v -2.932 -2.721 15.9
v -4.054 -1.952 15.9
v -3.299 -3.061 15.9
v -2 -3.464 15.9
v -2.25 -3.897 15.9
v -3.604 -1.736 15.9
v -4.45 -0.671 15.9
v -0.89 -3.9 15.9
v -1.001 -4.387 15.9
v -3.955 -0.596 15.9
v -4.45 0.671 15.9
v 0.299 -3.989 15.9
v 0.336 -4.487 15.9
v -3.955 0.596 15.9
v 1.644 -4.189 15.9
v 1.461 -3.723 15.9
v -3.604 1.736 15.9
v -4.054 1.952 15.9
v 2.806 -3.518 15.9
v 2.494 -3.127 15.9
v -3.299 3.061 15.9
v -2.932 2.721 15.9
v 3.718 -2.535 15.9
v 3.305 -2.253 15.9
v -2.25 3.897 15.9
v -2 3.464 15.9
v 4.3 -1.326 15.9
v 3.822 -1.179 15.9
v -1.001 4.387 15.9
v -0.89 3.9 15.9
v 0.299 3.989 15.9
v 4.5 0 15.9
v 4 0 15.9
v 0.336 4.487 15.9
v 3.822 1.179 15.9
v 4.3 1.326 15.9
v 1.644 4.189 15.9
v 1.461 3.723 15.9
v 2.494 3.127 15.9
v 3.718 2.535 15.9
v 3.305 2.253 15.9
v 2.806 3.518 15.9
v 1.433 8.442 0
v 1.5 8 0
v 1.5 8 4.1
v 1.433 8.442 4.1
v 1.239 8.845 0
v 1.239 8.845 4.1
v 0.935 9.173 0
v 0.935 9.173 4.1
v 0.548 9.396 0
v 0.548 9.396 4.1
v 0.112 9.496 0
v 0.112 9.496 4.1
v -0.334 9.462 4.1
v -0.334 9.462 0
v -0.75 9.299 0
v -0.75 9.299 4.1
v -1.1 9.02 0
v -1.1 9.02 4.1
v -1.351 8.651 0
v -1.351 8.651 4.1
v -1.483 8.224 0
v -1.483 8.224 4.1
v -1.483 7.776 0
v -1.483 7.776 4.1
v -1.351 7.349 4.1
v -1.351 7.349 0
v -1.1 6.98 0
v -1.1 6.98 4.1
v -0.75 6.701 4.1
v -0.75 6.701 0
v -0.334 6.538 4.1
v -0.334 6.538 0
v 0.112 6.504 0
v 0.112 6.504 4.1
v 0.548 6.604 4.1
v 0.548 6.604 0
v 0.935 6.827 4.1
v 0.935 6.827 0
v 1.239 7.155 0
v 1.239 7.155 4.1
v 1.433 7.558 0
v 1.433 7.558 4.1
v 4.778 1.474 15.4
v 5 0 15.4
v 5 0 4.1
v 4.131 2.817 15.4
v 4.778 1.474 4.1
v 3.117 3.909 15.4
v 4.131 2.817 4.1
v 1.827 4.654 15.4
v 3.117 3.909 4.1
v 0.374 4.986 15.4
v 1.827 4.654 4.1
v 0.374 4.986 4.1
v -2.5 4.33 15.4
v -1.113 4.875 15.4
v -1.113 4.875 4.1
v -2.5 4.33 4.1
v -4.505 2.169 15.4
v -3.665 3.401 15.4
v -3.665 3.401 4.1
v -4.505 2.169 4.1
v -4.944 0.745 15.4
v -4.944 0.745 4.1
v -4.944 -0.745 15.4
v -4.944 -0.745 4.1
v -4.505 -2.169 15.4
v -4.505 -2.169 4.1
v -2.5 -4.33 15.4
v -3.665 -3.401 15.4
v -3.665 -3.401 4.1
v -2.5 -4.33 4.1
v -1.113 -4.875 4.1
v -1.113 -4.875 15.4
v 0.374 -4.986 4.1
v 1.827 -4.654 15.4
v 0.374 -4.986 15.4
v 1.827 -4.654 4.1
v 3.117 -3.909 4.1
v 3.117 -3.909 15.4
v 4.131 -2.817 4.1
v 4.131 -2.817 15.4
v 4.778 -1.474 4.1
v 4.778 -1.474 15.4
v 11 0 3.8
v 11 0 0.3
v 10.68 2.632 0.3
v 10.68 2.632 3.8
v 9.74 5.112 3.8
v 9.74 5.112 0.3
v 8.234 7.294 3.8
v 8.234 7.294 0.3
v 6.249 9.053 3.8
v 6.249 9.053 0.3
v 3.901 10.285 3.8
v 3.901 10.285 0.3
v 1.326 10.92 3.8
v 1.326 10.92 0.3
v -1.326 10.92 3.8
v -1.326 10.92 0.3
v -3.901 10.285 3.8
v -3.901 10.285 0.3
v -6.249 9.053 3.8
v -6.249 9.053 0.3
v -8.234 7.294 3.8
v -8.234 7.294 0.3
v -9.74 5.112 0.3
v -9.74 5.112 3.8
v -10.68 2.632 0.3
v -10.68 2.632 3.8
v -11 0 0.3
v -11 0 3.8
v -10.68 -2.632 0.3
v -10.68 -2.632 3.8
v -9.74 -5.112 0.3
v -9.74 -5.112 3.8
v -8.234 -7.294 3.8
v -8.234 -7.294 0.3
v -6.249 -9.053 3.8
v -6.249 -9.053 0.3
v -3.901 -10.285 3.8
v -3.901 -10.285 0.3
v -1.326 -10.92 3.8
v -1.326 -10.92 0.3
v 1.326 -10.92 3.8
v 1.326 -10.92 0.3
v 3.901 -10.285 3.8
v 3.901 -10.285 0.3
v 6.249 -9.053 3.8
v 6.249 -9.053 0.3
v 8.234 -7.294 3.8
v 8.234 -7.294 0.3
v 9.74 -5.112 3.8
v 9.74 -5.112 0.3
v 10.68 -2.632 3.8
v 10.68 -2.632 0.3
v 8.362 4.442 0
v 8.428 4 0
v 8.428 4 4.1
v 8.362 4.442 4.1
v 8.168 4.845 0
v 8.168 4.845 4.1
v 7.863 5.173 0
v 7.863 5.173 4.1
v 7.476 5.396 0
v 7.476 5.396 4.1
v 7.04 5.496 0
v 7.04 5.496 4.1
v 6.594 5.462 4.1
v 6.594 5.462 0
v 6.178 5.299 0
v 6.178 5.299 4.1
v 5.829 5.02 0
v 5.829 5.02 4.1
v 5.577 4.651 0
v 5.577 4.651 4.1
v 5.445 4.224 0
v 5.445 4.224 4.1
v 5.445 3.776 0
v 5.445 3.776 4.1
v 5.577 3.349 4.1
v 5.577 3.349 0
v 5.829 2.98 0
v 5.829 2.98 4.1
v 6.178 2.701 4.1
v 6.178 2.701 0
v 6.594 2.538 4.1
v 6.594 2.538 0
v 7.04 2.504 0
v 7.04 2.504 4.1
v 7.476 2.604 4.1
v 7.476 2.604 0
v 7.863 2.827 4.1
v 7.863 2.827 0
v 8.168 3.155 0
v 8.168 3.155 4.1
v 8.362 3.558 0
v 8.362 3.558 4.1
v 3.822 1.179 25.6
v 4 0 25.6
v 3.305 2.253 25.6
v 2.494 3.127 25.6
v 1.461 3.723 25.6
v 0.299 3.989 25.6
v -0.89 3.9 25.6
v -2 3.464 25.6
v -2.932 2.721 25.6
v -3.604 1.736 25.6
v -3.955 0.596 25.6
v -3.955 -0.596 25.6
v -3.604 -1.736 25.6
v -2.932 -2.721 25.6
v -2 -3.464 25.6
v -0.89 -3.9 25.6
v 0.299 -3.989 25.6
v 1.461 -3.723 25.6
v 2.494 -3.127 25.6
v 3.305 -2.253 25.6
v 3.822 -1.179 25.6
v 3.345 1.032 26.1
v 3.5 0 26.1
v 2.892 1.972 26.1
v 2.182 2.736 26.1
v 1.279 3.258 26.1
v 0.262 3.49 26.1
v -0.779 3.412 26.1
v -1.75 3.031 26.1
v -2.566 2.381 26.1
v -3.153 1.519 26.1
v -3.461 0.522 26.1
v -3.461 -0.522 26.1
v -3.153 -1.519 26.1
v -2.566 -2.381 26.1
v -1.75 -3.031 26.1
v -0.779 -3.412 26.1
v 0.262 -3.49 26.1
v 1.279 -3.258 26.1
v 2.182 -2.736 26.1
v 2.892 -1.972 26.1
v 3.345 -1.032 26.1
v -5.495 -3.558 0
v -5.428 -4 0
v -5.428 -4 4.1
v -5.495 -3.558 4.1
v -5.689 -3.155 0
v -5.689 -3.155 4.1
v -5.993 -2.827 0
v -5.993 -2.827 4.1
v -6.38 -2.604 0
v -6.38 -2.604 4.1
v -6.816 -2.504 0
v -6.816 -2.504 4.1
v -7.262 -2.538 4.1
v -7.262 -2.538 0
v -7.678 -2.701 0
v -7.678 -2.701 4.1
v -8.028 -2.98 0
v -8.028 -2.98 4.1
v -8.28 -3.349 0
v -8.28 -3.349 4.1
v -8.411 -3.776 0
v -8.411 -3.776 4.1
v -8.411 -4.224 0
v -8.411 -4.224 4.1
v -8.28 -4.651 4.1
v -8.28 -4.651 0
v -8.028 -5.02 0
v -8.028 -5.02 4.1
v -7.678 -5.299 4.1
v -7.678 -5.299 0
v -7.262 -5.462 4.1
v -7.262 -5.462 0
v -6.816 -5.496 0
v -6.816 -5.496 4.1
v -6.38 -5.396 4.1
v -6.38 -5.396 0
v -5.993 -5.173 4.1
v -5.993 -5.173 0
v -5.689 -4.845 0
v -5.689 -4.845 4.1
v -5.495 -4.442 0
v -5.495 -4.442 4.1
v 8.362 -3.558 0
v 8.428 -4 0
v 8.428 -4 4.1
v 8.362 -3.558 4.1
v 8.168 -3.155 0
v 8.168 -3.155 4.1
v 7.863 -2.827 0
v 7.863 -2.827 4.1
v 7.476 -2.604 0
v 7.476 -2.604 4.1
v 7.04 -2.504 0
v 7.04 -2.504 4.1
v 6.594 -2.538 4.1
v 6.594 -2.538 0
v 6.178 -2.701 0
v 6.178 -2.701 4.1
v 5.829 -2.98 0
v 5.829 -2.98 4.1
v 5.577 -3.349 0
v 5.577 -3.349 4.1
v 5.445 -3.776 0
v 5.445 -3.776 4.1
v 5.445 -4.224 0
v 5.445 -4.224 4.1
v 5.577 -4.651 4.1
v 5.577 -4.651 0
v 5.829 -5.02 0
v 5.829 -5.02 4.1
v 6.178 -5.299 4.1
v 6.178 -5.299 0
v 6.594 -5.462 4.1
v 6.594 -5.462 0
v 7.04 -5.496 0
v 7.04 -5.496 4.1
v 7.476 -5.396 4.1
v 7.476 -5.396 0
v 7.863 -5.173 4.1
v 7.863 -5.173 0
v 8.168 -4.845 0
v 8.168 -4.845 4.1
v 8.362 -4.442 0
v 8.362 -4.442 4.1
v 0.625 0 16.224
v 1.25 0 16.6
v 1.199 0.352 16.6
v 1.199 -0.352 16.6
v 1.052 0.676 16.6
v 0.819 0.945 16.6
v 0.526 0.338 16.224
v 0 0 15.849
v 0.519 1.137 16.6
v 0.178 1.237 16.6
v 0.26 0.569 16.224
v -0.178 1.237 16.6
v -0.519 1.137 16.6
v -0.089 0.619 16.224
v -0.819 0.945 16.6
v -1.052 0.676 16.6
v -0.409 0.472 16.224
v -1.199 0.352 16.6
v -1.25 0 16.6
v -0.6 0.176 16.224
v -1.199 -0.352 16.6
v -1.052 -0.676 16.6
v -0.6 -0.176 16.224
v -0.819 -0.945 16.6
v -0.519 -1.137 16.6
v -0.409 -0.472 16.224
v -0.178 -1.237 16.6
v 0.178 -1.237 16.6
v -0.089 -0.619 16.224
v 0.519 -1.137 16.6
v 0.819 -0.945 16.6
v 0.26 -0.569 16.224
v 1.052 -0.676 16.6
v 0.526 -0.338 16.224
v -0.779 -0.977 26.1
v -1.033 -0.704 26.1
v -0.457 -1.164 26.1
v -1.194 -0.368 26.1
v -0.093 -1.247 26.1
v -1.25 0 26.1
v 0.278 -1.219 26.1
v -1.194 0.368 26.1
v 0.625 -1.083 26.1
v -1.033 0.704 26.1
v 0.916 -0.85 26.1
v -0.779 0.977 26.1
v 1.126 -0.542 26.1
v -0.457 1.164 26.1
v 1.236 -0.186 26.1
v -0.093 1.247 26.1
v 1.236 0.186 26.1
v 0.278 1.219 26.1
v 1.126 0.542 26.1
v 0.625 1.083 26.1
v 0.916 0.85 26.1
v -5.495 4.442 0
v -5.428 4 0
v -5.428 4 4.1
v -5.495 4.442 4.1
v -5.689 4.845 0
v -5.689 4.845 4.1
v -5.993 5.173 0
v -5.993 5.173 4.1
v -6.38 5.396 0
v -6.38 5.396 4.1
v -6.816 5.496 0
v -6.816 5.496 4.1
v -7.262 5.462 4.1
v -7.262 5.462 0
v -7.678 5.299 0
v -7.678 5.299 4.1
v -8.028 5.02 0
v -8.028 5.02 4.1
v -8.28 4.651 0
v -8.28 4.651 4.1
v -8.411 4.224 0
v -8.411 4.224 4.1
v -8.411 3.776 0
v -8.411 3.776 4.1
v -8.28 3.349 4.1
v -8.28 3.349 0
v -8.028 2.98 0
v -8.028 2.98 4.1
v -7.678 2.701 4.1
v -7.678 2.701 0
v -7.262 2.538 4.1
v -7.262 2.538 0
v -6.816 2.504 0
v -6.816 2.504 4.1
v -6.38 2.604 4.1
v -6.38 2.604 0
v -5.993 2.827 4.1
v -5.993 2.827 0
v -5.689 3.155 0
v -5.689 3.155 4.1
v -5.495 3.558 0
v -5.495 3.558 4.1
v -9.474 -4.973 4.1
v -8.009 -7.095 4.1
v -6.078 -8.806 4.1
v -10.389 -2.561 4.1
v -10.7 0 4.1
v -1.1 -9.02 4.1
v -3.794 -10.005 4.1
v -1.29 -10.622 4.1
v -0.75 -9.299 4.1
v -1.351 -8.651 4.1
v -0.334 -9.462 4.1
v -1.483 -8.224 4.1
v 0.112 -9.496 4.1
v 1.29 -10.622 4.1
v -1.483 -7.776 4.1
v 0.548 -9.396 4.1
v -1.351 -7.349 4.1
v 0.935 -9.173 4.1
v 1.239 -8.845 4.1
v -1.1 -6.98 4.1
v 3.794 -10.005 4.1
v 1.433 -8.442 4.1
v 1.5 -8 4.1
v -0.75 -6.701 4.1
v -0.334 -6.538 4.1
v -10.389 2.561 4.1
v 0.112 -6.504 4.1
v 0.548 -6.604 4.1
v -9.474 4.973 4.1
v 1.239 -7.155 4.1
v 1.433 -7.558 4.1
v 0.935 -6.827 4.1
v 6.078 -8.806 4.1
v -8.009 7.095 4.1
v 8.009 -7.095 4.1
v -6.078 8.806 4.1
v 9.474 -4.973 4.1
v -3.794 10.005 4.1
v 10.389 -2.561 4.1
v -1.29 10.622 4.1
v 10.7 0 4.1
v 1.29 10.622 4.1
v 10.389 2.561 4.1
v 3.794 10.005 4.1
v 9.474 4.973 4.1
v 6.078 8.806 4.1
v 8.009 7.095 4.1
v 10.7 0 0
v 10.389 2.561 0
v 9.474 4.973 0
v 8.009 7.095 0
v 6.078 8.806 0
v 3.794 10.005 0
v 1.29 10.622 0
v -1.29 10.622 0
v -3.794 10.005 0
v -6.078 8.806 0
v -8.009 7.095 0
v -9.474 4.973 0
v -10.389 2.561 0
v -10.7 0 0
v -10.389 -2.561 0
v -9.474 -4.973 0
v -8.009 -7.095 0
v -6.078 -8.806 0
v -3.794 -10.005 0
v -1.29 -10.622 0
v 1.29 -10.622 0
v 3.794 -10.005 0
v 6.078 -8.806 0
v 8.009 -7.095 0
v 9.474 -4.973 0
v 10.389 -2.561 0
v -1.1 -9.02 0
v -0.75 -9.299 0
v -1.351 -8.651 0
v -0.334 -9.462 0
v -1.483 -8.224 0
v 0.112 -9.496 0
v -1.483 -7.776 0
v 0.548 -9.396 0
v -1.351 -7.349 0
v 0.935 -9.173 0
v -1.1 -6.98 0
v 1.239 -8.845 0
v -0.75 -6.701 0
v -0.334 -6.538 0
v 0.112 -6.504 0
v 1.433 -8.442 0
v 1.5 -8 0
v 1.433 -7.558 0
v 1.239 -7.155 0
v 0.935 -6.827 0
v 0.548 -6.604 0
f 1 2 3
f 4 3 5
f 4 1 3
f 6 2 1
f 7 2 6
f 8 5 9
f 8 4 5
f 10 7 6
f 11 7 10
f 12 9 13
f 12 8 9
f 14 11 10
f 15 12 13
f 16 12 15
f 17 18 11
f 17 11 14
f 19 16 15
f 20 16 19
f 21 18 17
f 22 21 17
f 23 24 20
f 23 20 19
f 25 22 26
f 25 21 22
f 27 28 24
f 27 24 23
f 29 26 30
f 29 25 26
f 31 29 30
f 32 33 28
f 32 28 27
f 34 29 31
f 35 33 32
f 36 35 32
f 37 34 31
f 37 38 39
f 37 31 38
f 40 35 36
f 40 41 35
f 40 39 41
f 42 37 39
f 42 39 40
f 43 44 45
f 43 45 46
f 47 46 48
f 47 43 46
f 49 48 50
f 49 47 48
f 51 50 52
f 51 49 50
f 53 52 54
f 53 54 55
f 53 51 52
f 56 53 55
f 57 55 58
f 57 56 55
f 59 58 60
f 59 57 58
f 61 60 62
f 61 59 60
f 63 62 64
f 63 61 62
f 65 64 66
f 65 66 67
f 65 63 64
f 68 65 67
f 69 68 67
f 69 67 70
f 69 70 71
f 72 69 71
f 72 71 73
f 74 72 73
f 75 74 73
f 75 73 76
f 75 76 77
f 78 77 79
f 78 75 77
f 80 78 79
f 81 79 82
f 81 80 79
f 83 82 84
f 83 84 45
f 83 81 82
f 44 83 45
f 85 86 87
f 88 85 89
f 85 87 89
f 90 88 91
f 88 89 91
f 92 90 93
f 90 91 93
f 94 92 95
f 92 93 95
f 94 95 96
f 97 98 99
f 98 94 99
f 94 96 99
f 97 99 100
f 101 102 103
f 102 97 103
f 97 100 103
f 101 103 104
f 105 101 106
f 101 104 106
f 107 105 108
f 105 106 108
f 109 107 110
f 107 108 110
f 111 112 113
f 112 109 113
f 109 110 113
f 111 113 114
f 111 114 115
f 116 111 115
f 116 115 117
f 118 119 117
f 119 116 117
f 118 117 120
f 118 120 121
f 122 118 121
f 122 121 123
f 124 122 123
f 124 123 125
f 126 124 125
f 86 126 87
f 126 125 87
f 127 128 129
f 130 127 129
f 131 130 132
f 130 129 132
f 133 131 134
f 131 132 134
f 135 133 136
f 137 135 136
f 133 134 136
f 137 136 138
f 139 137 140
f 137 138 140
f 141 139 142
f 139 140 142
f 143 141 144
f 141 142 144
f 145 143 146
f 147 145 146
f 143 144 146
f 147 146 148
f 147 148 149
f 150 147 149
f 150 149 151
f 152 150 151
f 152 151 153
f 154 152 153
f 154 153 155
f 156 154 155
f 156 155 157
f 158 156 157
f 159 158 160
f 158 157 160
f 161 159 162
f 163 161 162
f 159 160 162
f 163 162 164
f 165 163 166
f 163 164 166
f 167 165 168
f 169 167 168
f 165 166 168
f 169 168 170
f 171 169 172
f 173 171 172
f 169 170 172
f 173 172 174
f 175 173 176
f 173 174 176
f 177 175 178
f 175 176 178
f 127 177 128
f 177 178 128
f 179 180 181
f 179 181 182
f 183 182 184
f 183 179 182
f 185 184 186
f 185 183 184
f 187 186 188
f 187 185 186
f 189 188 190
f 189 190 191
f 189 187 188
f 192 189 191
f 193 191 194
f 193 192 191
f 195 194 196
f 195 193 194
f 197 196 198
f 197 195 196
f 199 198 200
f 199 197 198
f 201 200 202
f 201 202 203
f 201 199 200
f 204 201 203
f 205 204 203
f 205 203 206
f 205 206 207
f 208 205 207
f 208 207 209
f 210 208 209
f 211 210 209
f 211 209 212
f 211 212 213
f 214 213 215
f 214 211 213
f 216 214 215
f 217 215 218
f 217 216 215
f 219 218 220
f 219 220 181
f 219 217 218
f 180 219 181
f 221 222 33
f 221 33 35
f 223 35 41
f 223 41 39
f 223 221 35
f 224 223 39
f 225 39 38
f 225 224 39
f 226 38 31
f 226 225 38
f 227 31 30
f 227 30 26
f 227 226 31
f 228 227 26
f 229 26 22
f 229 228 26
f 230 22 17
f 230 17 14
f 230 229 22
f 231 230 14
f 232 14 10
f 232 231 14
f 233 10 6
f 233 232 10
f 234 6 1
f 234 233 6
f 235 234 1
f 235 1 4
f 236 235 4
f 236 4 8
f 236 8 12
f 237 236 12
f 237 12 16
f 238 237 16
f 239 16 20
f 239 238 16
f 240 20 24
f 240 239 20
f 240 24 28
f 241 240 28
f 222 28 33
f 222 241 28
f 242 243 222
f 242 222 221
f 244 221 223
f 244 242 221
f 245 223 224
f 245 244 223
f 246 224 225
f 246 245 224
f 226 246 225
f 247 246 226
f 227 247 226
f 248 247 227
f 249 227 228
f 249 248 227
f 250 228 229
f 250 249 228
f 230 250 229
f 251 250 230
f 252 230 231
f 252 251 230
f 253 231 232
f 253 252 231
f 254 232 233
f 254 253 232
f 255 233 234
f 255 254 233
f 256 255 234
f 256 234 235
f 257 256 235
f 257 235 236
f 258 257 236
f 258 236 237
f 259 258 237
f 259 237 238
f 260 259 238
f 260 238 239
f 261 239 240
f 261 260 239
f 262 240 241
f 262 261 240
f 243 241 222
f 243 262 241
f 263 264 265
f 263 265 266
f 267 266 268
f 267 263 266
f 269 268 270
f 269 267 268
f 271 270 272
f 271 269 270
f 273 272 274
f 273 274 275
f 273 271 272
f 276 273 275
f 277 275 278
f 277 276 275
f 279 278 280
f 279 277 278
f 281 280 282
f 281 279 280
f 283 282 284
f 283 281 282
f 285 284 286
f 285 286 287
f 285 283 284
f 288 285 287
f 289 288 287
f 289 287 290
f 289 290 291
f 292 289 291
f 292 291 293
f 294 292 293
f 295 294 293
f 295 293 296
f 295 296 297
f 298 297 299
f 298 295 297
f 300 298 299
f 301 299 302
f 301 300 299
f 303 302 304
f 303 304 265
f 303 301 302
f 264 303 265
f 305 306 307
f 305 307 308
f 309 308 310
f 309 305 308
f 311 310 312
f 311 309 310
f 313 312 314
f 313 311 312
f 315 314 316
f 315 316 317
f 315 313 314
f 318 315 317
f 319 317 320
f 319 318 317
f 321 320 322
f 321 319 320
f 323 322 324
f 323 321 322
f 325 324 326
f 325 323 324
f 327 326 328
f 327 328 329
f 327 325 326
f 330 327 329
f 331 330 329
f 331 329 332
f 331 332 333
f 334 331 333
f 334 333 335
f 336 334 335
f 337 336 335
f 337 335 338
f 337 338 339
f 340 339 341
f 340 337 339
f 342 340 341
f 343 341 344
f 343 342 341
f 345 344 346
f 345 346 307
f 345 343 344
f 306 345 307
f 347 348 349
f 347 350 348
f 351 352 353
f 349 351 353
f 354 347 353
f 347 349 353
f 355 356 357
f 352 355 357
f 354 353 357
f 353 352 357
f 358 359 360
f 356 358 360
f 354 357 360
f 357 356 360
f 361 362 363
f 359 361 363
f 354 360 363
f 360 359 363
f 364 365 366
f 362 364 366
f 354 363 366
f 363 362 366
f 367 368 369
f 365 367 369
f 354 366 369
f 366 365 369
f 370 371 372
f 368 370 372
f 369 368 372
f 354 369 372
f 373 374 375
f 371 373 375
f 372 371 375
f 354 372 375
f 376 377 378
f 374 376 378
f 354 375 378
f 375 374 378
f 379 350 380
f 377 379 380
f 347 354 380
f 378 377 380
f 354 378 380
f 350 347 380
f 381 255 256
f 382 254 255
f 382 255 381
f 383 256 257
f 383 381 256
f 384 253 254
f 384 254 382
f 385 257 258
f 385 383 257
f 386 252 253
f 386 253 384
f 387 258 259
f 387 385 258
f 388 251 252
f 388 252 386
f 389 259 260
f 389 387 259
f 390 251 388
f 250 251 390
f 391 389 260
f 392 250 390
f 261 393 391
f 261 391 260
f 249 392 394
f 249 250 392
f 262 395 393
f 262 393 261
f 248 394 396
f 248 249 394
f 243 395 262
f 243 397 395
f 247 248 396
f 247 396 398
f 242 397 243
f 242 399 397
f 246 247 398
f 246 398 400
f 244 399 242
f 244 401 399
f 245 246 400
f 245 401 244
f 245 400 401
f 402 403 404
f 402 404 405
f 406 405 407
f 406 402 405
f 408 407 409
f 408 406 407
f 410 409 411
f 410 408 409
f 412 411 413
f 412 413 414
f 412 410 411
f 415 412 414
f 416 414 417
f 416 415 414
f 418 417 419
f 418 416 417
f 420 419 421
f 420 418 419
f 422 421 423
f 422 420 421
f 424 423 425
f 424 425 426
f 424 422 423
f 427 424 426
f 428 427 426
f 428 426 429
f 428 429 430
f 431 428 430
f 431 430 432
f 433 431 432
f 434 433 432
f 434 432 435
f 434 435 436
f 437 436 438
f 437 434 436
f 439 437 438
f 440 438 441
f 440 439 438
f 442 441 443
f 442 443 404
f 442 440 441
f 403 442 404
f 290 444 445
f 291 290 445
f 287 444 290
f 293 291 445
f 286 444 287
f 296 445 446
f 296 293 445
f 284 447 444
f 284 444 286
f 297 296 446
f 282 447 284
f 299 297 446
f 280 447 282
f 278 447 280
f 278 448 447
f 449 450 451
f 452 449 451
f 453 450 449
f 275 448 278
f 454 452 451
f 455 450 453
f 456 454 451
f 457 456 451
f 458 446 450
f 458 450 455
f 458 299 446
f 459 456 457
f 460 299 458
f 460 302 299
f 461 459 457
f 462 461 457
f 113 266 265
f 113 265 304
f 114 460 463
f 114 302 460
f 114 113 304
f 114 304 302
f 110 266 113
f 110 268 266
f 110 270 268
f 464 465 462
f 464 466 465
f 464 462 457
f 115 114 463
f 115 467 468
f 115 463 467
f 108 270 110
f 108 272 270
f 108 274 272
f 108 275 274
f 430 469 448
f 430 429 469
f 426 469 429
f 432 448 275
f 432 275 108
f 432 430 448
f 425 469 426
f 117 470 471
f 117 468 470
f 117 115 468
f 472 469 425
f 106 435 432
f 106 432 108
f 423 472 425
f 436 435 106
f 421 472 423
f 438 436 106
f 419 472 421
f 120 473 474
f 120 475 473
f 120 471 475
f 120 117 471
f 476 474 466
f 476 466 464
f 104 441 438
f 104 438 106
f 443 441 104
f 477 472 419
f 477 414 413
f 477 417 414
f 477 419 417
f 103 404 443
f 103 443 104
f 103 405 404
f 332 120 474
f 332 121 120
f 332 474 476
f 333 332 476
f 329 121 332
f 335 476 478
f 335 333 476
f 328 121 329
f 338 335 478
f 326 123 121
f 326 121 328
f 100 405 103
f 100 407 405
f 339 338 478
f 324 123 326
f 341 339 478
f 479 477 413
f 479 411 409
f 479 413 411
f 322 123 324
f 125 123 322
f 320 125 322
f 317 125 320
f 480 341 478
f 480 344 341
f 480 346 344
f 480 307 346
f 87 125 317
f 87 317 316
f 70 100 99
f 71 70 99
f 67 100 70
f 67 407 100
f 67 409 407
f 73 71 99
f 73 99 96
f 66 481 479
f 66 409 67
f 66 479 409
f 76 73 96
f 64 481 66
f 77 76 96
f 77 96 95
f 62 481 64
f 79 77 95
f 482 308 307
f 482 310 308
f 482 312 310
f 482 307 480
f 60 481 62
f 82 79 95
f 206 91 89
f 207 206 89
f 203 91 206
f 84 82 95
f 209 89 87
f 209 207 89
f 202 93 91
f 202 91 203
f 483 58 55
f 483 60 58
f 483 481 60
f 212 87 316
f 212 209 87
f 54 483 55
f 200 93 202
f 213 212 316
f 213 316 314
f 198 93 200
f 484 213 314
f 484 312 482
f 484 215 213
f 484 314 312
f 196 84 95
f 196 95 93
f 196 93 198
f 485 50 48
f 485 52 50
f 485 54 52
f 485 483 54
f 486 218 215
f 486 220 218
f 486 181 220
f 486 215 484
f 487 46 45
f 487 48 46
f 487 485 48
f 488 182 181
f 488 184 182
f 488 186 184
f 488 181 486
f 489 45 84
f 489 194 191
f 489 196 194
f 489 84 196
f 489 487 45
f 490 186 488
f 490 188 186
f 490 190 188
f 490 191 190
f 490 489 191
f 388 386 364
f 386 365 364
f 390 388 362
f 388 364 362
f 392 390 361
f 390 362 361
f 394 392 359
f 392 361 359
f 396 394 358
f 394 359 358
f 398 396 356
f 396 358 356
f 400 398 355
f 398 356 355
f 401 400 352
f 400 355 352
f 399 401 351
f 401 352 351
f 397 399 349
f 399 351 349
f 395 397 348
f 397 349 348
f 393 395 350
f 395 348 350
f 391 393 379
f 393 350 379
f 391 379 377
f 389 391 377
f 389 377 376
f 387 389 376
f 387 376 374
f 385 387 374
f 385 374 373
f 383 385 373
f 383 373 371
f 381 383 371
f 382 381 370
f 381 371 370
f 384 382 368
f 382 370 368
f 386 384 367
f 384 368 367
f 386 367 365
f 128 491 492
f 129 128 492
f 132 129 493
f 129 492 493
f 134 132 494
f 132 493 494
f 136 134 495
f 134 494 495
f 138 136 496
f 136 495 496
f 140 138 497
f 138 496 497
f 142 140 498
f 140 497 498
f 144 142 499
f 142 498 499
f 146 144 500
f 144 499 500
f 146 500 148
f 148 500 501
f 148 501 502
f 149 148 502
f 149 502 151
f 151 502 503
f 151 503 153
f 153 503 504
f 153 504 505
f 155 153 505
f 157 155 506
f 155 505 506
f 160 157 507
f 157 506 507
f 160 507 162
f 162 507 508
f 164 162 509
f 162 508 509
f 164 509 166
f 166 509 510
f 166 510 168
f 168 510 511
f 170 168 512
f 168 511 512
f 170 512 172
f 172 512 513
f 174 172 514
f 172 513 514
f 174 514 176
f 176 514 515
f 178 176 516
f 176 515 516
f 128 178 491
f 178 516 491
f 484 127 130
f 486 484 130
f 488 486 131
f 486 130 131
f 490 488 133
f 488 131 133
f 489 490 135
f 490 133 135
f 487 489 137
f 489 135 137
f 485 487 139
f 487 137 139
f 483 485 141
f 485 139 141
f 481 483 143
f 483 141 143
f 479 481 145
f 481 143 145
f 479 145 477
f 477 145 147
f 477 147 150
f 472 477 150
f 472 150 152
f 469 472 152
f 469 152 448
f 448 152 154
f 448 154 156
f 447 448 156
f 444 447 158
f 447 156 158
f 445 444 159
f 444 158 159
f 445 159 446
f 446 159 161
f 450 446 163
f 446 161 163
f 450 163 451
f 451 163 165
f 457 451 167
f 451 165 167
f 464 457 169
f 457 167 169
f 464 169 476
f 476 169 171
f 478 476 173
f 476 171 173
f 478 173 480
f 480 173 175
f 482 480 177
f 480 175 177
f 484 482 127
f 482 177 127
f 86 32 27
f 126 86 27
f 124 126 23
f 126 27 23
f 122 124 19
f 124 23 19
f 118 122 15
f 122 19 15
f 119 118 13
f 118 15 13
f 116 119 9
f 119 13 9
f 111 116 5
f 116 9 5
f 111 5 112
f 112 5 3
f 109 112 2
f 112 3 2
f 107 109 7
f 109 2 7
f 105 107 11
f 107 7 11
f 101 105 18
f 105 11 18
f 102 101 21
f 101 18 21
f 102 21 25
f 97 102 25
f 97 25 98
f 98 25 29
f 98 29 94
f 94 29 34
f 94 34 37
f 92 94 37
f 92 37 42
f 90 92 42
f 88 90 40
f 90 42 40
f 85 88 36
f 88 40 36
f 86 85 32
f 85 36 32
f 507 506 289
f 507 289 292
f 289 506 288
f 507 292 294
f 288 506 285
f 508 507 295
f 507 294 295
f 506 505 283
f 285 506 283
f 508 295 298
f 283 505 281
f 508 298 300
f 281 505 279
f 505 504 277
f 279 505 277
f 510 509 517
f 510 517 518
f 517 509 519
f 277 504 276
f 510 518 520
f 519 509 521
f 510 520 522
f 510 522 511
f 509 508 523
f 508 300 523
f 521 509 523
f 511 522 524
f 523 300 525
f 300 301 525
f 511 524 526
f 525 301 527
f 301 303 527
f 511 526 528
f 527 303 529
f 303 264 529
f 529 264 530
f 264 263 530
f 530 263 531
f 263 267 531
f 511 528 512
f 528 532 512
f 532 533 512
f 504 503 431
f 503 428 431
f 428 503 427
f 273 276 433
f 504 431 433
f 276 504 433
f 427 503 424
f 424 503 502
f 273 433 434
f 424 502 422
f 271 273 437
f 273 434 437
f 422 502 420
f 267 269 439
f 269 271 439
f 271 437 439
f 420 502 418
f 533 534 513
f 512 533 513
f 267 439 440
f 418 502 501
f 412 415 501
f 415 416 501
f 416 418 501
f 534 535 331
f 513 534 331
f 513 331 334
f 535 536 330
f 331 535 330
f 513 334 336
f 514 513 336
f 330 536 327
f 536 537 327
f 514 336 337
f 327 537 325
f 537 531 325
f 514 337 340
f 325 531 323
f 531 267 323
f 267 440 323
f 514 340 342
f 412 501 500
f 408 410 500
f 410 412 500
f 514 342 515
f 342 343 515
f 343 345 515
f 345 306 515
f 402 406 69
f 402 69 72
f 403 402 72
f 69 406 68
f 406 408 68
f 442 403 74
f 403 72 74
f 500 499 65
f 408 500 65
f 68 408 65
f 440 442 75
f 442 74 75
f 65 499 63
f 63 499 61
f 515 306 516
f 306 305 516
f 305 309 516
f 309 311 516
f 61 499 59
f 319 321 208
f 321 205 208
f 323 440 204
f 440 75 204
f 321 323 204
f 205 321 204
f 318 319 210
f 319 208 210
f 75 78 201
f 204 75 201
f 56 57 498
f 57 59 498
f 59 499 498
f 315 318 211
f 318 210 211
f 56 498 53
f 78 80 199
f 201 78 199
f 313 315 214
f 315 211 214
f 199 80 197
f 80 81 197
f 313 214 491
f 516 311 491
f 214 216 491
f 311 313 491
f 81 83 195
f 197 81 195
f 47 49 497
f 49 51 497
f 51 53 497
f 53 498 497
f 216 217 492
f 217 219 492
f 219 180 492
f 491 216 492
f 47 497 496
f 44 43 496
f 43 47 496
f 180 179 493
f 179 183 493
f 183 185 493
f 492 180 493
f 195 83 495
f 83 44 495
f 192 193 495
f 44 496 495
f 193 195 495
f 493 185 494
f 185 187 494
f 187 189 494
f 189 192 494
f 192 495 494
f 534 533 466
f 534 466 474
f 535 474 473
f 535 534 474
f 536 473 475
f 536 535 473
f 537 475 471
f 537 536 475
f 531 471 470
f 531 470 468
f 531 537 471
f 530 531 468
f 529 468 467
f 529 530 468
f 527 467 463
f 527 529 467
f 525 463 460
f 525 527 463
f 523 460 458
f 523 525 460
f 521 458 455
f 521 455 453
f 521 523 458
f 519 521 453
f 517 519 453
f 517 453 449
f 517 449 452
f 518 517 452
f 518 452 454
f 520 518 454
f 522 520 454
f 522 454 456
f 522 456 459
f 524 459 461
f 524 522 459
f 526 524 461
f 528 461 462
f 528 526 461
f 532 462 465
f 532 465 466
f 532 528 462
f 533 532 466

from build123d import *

# Parameters (mm, degrees)
SKETCH_1_R             = 11
SKETCH_1_R_2           = 1.5
EXTRUDE_1_DEPTH        = 4.1
SKETCH_2_R             = 5
EXTRUDE_2_DEPTH        = 22
SKETCH_3_OUTSIDE_W     = 32.122
SKETCH_3_OUTSIDE_H     = 32.122
SKETCH_3_OUTSIDE_R     = 4
CUT_EXTRUDE_1_DEPTH    = 10.2
CHAMFER_1_SIZE         = 0.5
HOLE_WIZARD_M3_1_D     = 2.5
HOLE_WIZARD_M3_1_DEPTH = 9.5
HOLE_WIZARD_M3_1_TIP   = 0.751075774
CHAMFER_2_SIZE         = 0.3


with BuildPart() as part:
    # 草图1 → 凸台-拉伸1 (new body)
    with BuildSketch(Plane.XY):
        Circle(SKETCH_1_R)
        with Locations((0, 8)):
            Circle(SKETCH_1_R_2, mode=Mode.SUBTRACT)
        with Locations((6.92820323, 4)):
            Circle(SKETCH_1_R_2, mode=Mode.SUBTRACT)
        with Locations((6.92820323, -4)):
            Circle(SKETCH_1_R_2, mode=Mode.SUBTRACT)
        with Locations((0, -8)):
            Circle(SKETCH_1_R_2, mode=Mode.SUBTRACT)
        with Locations((-6.92820323, -4)):
            Circle(SKETCH_1_R_2, mode=Mode.SUBTRACT)
        with Locations((-6.92820323, 4)):
            Circle(SKETCH_1_R_2, mode=Mode.SUBTRACT)
    extrude(amount=EXTRUDE_1_DEPTH)

    # 草图2 → 凸台-拉伸2 (add)
    with BuildSketch(Plane.XY.offset(4.1)):
        Circle(SKETCH_2_R)
    extrude(amount=EXTRUDE_2_DEPTH)

    # 草图3 outside → 切除-拉伸1 (cut)
    with BuildSketch(Plane.XY.offset(26.1)):
        Rectangle(SKETCH_3_OUTSIDE_W, SKETCH_3_OUTSIDE_H)
        Circle(SKETCH_3_OUTSIDE_R, mode=Mode.SUBTRACT)
    extrude(amount=-CUT_EXTRUDE_1_DEPTH, mode=Mode.SUBTRACT)

    # 倒角1
    chamfer_1_edges = [part.edges().sort_by_distance(p)[0] for p in [
        (-4, 0, 26.1),
        (-5, 0, 15.9),
    ]]
    chamfer(chamfer_1_edges, length=CHAMFER_1_SIZE)

    # M3 螺纹孔1
    with Locations(Plane.XY.offset(26.1)):
        with Locations((0, 0)):
            Hole(HOLE_WIZARD_M3_1_D / 2, depth=HOLE_WIZARD_M3_1_DEPTH)
            with Locations((0, 0, -(HOLE_WIZARD_M3_1_DEPTH + HOLE_WIZARD_M3_1_TIP / 2))):  # 118° drill point
                Cone(0, HOLE_WIZARD_M3_1_D / 2, HOLE_WIZARD_M3_1_TIP, mode=Mode.SUBTRACT)

    # 倒角2
    chamfer_2_edges = [part.edges().sort_by_distance(p)[0] for p in [
        (-11, 0, 0),
        (-11, 0, 4.1),
    ]]
    chamfer(chamfer_2_edges, length=CHAMFER_2_SIZE)


solid = part.part
